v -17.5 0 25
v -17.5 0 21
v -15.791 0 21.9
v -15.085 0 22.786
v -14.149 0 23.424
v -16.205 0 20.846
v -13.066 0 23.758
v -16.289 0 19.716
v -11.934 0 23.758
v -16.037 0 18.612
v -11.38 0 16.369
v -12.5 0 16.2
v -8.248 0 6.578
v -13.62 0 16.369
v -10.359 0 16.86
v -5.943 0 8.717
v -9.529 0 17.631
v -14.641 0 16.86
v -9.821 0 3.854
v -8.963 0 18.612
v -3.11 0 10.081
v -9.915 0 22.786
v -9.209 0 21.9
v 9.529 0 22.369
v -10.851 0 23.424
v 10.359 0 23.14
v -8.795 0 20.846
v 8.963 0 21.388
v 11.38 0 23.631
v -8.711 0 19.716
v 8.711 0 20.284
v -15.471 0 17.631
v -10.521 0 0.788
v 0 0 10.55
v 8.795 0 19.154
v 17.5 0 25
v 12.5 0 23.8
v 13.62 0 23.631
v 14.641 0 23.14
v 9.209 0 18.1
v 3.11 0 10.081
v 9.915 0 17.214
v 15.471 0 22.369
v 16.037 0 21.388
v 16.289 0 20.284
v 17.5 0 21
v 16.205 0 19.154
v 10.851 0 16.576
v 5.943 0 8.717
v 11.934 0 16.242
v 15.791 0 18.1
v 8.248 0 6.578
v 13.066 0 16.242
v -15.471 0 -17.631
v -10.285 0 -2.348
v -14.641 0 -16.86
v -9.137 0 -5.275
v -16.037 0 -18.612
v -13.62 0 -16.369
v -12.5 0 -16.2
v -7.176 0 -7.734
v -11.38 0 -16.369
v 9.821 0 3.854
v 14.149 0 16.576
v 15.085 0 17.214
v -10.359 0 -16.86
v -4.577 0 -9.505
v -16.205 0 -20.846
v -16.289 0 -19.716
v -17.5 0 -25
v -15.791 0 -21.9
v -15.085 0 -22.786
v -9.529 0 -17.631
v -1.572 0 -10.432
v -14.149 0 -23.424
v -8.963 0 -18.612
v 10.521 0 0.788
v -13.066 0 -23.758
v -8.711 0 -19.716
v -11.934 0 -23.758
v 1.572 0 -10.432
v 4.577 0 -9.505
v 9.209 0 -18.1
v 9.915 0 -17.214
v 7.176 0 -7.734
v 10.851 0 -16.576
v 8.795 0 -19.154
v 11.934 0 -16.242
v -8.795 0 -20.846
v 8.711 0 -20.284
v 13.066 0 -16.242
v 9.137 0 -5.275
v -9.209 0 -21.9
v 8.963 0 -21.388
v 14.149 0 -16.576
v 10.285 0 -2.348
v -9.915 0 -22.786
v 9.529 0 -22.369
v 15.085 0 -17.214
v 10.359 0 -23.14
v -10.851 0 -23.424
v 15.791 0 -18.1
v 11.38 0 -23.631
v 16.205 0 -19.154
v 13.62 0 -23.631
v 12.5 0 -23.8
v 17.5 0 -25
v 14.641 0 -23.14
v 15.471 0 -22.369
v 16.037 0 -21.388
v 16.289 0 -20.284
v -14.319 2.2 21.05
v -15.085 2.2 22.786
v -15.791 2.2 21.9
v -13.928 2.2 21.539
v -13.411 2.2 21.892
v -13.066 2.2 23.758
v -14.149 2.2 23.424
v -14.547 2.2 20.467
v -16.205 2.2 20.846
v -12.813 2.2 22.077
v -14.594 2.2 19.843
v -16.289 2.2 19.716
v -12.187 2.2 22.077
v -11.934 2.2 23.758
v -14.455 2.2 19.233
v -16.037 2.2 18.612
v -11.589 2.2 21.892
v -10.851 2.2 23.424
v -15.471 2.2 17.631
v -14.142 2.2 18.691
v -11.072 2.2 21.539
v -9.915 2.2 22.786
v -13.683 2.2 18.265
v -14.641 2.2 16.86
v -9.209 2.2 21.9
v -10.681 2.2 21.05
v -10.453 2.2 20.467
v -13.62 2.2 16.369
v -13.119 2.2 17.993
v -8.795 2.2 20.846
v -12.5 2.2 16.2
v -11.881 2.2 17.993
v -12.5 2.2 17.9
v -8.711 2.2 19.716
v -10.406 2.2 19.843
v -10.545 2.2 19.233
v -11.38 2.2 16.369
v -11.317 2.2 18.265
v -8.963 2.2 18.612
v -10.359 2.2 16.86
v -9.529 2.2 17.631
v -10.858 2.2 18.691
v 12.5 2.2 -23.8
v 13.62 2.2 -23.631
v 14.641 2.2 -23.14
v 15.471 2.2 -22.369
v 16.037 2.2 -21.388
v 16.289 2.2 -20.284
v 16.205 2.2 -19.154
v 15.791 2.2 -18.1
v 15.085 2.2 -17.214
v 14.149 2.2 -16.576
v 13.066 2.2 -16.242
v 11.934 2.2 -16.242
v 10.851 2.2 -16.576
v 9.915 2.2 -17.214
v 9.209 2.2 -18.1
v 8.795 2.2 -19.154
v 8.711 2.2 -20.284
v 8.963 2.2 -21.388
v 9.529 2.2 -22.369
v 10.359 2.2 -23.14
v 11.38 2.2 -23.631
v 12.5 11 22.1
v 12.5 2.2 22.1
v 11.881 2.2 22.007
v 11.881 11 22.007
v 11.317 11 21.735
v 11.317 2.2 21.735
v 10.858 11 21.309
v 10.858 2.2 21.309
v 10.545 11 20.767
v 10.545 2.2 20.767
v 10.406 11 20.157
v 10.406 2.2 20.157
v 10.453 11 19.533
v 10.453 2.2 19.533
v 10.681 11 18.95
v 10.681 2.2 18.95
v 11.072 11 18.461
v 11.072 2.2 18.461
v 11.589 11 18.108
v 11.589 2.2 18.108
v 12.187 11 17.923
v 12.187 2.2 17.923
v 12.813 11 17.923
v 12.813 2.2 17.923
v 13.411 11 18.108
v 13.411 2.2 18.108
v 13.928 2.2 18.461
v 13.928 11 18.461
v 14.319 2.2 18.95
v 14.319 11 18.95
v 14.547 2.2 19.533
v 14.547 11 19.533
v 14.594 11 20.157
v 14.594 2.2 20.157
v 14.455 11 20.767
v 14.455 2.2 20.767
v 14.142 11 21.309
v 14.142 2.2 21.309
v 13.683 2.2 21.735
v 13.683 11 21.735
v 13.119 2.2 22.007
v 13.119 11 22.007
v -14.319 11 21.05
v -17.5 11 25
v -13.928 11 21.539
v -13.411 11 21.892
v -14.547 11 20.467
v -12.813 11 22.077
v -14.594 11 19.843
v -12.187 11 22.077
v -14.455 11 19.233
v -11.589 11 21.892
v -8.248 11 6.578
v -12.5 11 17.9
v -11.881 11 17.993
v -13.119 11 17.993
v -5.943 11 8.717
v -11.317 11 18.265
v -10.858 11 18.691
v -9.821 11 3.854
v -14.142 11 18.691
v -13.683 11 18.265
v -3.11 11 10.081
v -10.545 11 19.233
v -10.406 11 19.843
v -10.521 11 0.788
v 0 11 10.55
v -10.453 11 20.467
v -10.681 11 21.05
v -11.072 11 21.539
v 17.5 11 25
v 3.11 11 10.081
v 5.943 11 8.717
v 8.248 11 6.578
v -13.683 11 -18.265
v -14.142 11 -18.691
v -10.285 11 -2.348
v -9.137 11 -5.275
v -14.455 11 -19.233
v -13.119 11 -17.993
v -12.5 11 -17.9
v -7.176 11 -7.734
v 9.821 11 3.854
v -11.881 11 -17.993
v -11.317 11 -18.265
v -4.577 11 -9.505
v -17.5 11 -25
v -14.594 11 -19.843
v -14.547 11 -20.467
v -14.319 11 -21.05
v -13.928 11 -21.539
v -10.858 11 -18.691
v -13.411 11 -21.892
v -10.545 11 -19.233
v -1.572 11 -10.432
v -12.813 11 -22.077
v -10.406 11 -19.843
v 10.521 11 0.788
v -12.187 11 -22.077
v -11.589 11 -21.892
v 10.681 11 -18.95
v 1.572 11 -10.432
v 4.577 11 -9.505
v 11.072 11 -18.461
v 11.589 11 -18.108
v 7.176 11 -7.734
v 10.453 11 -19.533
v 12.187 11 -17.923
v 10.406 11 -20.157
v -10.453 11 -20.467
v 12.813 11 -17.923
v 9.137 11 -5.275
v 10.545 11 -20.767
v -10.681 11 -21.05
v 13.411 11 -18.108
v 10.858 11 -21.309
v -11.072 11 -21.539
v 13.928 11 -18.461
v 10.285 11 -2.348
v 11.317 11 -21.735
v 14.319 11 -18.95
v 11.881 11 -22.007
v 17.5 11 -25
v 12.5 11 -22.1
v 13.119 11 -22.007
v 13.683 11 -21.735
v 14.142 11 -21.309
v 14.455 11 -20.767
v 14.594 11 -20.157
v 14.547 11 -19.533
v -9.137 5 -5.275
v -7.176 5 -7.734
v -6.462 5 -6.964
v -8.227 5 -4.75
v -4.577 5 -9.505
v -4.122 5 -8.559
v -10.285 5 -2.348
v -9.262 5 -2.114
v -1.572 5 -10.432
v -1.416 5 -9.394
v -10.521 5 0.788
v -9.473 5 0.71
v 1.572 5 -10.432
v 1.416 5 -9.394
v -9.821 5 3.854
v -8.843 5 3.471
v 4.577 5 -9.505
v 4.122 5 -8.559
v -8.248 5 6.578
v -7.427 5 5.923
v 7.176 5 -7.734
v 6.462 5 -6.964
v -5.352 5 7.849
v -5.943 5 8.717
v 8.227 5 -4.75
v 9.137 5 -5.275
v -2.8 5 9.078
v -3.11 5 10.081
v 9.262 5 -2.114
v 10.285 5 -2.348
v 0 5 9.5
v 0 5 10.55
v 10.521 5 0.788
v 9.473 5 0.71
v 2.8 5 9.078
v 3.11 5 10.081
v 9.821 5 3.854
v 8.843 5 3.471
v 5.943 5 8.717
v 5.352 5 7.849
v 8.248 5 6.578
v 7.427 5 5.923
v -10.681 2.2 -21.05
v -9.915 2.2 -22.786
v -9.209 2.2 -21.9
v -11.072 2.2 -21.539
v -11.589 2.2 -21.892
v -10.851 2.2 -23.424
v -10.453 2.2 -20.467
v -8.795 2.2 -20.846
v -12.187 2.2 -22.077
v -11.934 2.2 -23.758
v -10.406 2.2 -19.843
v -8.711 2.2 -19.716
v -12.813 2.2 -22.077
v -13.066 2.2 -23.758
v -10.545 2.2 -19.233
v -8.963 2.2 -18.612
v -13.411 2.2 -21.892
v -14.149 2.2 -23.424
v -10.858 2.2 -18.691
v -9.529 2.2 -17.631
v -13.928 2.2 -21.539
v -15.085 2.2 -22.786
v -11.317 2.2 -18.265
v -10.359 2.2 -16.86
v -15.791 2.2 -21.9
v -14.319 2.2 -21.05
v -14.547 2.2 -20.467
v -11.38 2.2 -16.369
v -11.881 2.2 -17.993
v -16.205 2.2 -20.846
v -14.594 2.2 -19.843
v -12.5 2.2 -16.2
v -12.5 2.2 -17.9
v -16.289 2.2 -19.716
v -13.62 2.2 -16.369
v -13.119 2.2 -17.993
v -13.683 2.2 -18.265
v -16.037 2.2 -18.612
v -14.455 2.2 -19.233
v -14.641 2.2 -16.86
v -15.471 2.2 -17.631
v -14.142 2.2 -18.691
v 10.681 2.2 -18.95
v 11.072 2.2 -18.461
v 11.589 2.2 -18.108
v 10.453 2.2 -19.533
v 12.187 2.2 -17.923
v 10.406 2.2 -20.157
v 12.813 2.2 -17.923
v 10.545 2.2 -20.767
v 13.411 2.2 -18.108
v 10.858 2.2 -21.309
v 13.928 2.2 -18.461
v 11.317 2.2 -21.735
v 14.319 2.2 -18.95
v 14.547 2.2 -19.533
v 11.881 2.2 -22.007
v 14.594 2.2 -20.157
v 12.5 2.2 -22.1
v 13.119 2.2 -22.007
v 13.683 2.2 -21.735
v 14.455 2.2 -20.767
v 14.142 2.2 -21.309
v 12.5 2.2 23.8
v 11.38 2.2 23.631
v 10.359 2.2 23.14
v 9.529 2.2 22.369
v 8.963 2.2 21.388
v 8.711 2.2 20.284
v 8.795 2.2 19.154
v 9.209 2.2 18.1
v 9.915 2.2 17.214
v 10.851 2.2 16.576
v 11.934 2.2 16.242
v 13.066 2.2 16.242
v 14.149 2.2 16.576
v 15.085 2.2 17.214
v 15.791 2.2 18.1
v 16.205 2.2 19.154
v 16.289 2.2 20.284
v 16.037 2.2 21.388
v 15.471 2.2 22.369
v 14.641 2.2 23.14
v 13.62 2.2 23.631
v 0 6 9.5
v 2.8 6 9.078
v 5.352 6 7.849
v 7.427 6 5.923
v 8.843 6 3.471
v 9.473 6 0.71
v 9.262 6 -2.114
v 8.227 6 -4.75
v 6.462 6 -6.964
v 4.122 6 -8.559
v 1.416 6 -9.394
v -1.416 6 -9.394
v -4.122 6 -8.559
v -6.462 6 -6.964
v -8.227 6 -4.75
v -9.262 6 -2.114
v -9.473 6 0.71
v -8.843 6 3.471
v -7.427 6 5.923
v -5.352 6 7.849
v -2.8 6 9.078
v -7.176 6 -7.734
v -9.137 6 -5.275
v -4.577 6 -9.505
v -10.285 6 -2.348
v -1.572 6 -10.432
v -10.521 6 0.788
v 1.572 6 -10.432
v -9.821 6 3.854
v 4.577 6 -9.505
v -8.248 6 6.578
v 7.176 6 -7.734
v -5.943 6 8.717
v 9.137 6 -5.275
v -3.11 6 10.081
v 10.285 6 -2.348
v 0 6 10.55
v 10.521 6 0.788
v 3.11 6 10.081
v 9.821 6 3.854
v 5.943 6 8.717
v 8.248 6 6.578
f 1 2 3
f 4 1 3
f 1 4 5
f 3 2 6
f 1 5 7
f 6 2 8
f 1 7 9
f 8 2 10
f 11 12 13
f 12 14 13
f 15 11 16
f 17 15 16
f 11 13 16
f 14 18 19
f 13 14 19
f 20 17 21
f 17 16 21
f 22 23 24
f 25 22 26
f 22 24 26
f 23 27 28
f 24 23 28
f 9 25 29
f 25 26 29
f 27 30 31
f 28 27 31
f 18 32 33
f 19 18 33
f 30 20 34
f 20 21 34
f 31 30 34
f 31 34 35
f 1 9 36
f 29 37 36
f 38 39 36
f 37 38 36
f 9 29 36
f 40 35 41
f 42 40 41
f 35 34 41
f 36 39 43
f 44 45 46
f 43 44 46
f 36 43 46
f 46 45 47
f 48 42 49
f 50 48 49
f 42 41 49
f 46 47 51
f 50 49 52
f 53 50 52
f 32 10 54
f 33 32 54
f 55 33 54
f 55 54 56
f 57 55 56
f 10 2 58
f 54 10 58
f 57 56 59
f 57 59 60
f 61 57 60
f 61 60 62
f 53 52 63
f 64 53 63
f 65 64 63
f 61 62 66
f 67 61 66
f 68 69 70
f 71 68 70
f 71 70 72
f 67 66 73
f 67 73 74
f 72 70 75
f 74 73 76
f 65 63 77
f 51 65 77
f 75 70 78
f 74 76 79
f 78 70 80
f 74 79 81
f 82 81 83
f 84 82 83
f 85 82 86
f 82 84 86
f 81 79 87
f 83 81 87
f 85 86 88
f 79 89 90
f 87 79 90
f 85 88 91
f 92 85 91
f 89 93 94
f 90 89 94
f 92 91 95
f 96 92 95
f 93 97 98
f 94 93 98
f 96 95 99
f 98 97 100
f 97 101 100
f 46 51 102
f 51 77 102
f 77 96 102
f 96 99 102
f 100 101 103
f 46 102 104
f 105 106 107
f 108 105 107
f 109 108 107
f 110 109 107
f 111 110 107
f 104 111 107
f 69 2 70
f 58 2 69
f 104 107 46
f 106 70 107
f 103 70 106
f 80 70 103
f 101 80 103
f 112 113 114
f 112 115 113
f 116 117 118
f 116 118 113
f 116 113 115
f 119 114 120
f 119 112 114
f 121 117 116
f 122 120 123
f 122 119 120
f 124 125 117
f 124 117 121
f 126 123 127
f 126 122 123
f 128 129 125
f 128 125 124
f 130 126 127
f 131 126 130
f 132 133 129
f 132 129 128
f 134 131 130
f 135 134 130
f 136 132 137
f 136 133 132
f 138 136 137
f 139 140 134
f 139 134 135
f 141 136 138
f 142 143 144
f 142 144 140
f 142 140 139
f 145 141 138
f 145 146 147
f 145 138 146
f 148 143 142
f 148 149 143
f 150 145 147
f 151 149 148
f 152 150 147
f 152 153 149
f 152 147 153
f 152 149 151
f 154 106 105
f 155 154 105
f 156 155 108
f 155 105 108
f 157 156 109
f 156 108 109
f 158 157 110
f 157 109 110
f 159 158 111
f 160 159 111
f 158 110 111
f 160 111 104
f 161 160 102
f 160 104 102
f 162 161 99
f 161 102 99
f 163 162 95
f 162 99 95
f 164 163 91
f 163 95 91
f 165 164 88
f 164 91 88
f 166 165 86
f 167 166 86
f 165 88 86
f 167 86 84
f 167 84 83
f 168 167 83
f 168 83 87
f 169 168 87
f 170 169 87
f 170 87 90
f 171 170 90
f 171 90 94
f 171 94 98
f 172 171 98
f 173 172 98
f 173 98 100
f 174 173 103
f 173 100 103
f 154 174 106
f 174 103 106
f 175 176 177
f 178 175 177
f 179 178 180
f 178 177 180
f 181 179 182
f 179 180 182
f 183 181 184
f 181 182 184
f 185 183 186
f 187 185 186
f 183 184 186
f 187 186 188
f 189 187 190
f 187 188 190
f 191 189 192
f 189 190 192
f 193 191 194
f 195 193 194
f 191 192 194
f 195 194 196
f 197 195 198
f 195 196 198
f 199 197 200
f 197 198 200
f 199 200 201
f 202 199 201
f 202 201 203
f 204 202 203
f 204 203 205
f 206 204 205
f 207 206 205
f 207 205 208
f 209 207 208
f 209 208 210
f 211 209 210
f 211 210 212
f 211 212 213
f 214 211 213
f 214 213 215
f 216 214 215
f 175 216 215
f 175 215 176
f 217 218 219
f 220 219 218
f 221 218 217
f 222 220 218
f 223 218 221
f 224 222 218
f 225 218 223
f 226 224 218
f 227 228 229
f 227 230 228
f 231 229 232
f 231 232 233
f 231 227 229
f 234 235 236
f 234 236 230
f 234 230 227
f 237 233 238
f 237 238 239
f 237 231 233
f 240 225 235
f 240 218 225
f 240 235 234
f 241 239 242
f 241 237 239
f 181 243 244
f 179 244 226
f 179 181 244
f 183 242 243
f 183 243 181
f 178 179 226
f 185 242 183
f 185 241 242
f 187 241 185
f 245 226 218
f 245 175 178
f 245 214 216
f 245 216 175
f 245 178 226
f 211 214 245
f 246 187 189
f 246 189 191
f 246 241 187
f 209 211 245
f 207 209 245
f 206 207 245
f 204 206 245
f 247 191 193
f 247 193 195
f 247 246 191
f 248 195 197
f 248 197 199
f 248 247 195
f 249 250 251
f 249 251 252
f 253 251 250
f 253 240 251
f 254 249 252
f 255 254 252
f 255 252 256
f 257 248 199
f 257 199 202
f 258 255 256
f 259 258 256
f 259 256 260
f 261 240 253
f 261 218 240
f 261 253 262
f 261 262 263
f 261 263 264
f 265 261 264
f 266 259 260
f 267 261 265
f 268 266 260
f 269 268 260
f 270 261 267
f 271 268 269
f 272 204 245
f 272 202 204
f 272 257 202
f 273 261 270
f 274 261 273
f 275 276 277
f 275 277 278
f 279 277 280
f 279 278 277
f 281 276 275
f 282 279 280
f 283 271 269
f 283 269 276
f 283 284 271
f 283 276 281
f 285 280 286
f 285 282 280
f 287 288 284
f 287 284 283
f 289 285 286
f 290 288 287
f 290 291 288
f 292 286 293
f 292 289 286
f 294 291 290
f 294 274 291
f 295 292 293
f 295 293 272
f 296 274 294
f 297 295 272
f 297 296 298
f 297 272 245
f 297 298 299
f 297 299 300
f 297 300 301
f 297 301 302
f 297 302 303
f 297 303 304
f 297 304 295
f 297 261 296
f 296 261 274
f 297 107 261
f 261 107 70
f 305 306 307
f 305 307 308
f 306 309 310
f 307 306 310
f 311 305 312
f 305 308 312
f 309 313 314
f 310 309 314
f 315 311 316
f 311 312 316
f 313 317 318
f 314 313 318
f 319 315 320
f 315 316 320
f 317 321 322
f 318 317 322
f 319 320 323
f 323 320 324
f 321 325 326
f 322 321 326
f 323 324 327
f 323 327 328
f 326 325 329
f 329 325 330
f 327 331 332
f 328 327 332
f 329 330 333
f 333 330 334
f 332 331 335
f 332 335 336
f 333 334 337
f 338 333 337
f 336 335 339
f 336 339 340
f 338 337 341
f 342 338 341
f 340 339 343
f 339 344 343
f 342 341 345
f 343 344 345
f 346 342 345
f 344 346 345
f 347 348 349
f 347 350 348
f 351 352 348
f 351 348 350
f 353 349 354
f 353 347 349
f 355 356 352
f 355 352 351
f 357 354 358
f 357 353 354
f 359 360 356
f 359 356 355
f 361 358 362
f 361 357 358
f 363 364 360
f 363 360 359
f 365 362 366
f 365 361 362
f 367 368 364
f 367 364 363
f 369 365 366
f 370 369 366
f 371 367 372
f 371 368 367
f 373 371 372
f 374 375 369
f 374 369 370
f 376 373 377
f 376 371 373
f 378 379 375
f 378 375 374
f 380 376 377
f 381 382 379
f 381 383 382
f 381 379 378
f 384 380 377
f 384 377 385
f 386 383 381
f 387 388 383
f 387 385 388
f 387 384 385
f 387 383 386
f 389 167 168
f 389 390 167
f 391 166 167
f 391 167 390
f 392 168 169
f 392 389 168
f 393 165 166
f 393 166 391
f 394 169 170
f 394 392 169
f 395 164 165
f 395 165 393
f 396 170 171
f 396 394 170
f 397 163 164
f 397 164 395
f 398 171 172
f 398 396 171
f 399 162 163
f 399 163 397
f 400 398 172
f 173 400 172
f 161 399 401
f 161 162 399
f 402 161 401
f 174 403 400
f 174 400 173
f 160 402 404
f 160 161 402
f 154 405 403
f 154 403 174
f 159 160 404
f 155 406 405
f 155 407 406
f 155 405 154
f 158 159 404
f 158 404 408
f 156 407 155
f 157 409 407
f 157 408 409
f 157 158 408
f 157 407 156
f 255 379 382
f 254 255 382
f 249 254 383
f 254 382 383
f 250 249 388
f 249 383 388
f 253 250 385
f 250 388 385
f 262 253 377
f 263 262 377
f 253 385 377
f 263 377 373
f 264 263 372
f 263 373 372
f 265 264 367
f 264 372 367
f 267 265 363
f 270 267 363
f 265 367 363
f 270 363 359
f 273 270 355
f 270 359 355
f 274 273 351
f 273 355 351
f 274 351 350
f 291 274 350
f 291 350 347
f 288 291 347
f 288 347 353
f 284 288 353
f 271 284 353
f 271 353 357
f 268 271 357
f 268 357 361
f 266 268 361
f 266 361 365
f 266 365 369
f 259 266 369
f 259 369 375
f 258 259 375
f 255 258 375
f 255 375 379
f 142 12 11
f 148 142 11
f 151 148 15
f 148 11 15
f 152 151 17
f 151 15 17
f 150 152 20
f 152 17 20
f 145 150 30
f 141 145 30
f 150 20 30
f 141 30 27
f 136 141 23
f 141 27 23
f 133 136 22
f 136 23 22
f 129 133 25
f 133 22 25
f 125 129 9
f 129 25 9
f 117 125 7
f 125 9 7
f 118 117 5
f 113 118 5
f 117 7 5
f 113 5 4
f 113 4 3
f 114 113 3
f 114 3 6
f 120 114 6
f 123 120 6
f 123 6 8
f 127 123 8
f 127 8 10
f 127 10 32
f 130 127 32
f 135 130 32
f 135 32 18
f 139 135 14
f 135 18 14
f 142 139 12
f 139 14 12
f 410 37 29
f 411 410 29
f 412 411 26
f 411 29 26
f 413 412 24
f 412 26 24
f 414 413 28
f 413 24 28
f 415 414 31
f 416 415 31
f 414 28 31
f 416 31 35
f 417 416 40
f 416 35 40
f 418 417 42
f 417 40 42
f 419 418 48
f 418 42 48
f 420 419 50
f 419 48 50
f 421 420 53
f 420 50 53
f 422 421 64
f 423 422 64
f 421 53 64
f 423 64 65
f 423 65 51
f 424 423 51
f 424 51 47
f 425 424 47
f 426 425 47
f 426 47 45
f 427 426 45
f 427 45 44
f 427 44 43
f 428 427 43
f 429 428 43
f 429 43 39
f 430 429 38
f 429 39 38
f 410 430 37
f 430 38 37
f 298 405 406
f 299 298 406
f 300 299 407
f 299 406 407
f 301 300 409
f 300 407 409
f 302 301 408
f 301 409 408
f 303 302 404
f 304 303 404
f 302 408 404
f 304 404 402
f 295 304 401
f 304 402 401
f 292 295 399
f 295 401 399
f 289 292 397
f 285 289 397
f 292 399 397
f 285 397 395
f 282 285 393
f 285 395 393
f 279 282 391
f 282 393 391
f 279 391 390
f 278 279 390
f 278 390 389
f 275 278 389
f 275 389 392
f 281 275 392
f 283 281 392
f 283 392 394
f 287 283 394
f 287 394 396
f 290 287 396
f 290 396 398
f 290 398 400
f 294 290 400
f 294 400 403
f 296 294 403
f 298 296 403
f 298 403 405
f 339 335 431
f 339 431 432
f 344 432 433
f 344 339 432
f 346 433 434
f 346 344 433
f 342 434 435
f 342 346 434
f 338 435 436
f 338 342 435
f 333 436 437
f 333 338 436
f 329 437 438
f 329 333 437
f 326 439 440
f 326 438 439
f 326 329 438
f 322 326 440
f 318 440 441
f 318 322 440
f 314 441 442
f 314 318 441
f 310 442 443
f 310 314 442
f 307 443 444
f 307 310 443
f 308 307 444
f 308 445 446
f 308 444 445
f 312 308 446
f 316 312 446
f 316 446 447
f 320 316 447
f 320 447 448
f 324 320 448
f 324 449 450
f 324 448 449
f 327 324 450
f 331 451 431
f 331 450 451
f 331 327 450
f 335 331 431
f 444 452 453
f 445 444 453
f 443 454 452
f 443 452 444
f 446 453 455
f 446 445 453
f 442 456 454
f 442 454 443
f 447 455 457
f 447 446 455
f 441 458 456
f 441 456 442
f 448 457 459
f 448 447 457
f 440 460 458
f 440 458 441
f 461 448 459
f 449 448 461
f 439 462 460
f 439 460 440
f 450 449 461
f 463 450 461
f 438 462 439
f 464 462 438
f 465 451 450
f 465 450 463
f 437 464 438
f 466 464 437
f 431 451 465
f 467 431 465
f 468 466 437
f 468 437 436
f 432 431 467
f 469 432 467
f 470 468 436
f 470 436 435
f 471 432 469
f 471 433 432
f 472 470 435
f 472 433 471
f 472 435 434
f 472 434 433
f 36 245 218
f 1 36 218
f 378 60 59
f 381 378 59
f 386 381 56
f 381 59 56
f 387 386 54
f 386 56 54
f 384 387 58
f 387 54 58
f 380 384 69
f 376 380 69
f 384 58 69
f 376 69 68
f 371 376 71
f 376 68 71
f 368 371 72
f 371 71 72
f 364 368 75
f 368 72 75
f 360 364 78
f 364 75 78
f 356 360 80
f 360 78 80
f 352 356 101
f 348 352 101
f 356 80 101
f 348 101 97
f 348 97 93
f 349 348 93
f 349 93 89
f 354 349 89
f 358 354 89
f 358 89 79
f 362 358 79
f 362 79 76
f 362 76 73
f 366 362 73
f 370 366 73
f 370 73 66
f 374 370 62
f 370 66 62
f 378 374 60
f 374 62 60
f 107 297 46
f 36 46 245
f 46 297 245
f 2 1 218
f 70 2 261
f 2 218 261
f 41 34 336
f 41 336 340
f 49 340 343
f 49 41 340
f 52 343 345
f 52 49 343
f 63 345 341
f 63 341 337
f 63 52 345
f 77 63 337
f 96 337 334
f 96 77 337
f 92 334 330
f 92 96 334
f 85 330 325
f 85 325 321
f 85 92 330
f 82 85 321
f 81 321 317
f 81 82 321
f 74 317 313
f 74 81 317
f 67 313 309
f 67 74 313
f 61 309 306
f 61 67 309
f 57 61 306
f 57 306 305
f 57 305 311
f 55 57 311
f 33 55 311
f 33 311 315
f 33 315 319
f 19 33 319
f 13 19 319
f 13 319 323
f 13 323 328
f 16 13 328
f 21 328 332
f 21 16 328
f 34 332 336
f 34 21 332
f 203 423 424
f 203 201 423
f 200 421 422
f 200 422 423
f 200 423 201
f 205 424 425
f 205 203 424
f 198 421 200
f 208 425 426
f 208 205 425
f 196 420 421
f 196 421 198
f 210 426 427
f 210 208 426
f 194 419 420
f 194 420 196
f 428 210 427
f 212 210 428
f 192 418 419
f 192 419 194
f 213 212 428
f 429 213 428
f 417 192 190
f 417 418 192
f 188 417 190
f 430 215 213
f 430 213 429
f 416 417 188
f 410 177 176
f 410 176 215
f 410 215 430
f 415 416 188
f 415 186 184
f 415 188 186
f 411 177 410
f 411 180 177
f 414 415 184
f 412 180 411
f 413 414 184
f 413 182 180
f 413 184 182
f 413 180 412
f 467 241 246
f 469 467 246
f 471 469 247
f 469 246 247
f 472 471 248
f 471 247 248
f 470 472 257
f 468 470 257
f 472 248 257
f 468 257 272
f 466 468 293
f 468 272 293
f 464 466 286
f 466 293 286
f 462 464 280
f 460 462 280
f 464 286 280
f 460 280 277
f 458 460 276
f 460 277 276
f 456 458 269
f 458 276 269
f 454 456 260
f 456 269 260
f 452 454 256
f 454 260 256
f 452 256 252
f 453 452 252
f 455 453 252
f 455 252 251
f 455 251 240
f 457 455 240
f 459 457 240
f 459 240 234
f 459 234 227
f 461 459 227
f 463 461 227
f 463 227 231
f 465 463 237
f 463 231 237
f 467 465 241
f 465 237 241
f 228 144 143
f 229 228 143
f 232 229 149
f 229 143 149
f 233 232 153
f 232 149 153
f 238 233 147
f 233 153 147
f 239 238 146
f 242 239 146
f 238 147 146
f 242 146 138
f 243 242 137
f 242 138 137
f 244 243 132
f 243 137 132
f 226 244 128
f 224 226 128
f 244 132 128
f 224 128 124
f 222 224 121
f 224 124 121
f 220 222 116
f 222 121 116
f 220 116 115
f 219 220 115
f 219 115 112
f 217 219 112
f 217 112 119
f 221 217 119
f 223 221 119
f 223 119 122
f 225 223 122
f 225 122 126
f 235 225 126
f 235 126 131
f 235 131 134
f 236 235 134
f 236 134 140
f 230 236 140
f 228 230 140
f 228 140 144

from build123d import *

# Parameters (mm, degrees)
SKETCH_1_R          = 9.5
EXTRUDE_1_DEPTH     = 11
SKETCH_2_R          = 10.55
CUT_EXTRUDE_1_DEPTH = 5
SKETCH_3_W          = 35
SKETCH_3_H          = 4
EXTRUDE_2_DEPTH     = 31
SKETCH_5_R          = 10.5
SKETCH_5_R_2        = 2.1
EXTRUDE_3_DEPTH     = 3.5
SKETCH_7_W          = 61.53340186
SKETCH_7_H          = 39.361856863
CUT_EXTRUDE_4_DEPTH = 56.138462075
SKETCH_8_R          = 2.1
CUT_EXTRUDE_5_DEPTH = 20
SKETCH_9_R          = 3.8
CUT_EXTRUDE_6_DEPTH = 2.2


with BuildPart() as part:
    # 草图1 → 凸台-拉伸1 (new body)
    with BuildSketch(Plane(origin=(0, 0, 0), x_dir=(1, 0, 0), z_dir=(0, 1, 0))):
        Polygon((-17.5, 0), (-17.5, -25), (17.5, -25), (17.5, 0), (17.5, 25), (-17.5, 25), align=None)
        with Locations(Location((0, 0, 0), (0, 0, 270))):
            Circle(SKETCH_1_R, mode=Mode.SUBTRACT)
    extrude(amount=EXTRUDE_1_DEPTH)

    # 草图2 → 切除-拉伸1 (cut)
    with BuildSketch(Plane(origin=(0, 11, 0), x_dir=(1, 0, 0), z_dir=(0, 1, 0))):
        with Locations(Location((0, 0, 0), (0, 0, 270))):
            Circle(SKETCH_2_R)
    cut_extrude_1 = extrude(amount=-CUT_EXTRUDE_1_DEPTH, mode=Mode.SUBTRACT)

    # 镜向1: 切除-拉伸1 across plane
    add(cut_extrude_1.mirror(Plane.ZX.offset(5.5)), mode=Mode.SUBTRACT)

    # 草图3 → 凸台-拉伸2 (add)
    with BuildSketch(Plane.XZ):
        with Locations((0, 23)):
            Rectangle(SKETCH_3_W, SKETCH_3_H)
    extrude(amount=EXTRUDE_2_DEPTH)

    # 草图5 → 凸台-拉伸3 (add)
    with BuildSketch(Plane.XZ.offset(31)):
        with BuildLine():
            Line((-17.5, 25), (-17.5, 0))
            ThreePointArc((-17.5, 0), (0, -17.5), (17.5, 0))
            Line((17.5, 0), (17.5, 25))
            Line((17.5, 25), (-17.5, 25))
        make_face()
        with Locations(Location((0, 0, 0), (0, 0, 270))):
            Circle(SKETCH_5_R, mode=Mode.SUBTRACT)
        with Locations(Location((0, 14, 0), (0, 0, 270))):
            Circle(SKETCH_5_R_2, mode=Mode.SUBTRACT)
        with Locations(Location((14, 0, 0), (0, 0, 270))):
            Circle(SKETCH_5_R_2, mode=Mode.SUBTRACT)
        with Locations(Location((0, -14, 0), (0, 0, 270))):
            Circle(SKETCH_5_R_2, mode=Mode.SUBTRACT)
        with Locations(Location((-14, 0, 0), (0, 0, 270))):
            Circle(SKETCH_5_R_2, mode=Mode.SUBTRACT)
    extrude(amount=EXTRUDE_3_DEPTH)

    # 草图7 → 切除-拉伸4 (cut, through all)
    with BuildSketch(Plane.ZY.offset(17.5)):
        with Locations((-3.514973955, -19.680928431)):
            Rectangle(SKETCH_7_W, SKETCH_7_H)
    extrude(amount=-CUT_EXTRUDE_4_DEPTH, mode=Mode.SUBTRACT)

    # 草图8 → 切除-拉伸5 (cut)
    with BuildSketch(Plane.XZ):
        with Locations(Location((-12.5, 20, 0), (0, 0, 270))):
            Circle(SKETCH_8_R)
        with Locations(Location((12.5, 20, 0), (0, 0, 90))):
            Circle(SKETCH_8_R)
        with Locations(Location((12.5, -20, 0), (0, 0, 270))):
            Circle(SKETCH_8_R)
        with Locations(Location((-12.5, -20, 0), (0, 0, 90))):
            Circle(SKETCH_8_R)
    extrude(amount=-CUT_EXTRUDE_5_DEPTH, mode=Mode.SUBTRACT)

    # 草图9 → 切除-拉伸6 (cut)
    with BuildSketch(Plane.XZ):
        with Locations(Location((-12.5, 20, 0), (0, 0, 270))):
            Circle(SKETCH_9_R)
        with Locations(Location((12.5, 20, 0), (0, 0, 90))):
            Circle(SKETCH_9_R)
        with Locations(Location((12.5, -20, 0), (0, 0, 270))):
            Circle(SKETCH_9_R)
        with Locations(Location((-12.5, -20, 0), (0, 0, 90))):
            Circle(SKETCH_9_R)
    extrude(amount=-CUT_EXTRUDE_6_DEPTH, mode=Mode.SUBTRACT)


solid = part.part
